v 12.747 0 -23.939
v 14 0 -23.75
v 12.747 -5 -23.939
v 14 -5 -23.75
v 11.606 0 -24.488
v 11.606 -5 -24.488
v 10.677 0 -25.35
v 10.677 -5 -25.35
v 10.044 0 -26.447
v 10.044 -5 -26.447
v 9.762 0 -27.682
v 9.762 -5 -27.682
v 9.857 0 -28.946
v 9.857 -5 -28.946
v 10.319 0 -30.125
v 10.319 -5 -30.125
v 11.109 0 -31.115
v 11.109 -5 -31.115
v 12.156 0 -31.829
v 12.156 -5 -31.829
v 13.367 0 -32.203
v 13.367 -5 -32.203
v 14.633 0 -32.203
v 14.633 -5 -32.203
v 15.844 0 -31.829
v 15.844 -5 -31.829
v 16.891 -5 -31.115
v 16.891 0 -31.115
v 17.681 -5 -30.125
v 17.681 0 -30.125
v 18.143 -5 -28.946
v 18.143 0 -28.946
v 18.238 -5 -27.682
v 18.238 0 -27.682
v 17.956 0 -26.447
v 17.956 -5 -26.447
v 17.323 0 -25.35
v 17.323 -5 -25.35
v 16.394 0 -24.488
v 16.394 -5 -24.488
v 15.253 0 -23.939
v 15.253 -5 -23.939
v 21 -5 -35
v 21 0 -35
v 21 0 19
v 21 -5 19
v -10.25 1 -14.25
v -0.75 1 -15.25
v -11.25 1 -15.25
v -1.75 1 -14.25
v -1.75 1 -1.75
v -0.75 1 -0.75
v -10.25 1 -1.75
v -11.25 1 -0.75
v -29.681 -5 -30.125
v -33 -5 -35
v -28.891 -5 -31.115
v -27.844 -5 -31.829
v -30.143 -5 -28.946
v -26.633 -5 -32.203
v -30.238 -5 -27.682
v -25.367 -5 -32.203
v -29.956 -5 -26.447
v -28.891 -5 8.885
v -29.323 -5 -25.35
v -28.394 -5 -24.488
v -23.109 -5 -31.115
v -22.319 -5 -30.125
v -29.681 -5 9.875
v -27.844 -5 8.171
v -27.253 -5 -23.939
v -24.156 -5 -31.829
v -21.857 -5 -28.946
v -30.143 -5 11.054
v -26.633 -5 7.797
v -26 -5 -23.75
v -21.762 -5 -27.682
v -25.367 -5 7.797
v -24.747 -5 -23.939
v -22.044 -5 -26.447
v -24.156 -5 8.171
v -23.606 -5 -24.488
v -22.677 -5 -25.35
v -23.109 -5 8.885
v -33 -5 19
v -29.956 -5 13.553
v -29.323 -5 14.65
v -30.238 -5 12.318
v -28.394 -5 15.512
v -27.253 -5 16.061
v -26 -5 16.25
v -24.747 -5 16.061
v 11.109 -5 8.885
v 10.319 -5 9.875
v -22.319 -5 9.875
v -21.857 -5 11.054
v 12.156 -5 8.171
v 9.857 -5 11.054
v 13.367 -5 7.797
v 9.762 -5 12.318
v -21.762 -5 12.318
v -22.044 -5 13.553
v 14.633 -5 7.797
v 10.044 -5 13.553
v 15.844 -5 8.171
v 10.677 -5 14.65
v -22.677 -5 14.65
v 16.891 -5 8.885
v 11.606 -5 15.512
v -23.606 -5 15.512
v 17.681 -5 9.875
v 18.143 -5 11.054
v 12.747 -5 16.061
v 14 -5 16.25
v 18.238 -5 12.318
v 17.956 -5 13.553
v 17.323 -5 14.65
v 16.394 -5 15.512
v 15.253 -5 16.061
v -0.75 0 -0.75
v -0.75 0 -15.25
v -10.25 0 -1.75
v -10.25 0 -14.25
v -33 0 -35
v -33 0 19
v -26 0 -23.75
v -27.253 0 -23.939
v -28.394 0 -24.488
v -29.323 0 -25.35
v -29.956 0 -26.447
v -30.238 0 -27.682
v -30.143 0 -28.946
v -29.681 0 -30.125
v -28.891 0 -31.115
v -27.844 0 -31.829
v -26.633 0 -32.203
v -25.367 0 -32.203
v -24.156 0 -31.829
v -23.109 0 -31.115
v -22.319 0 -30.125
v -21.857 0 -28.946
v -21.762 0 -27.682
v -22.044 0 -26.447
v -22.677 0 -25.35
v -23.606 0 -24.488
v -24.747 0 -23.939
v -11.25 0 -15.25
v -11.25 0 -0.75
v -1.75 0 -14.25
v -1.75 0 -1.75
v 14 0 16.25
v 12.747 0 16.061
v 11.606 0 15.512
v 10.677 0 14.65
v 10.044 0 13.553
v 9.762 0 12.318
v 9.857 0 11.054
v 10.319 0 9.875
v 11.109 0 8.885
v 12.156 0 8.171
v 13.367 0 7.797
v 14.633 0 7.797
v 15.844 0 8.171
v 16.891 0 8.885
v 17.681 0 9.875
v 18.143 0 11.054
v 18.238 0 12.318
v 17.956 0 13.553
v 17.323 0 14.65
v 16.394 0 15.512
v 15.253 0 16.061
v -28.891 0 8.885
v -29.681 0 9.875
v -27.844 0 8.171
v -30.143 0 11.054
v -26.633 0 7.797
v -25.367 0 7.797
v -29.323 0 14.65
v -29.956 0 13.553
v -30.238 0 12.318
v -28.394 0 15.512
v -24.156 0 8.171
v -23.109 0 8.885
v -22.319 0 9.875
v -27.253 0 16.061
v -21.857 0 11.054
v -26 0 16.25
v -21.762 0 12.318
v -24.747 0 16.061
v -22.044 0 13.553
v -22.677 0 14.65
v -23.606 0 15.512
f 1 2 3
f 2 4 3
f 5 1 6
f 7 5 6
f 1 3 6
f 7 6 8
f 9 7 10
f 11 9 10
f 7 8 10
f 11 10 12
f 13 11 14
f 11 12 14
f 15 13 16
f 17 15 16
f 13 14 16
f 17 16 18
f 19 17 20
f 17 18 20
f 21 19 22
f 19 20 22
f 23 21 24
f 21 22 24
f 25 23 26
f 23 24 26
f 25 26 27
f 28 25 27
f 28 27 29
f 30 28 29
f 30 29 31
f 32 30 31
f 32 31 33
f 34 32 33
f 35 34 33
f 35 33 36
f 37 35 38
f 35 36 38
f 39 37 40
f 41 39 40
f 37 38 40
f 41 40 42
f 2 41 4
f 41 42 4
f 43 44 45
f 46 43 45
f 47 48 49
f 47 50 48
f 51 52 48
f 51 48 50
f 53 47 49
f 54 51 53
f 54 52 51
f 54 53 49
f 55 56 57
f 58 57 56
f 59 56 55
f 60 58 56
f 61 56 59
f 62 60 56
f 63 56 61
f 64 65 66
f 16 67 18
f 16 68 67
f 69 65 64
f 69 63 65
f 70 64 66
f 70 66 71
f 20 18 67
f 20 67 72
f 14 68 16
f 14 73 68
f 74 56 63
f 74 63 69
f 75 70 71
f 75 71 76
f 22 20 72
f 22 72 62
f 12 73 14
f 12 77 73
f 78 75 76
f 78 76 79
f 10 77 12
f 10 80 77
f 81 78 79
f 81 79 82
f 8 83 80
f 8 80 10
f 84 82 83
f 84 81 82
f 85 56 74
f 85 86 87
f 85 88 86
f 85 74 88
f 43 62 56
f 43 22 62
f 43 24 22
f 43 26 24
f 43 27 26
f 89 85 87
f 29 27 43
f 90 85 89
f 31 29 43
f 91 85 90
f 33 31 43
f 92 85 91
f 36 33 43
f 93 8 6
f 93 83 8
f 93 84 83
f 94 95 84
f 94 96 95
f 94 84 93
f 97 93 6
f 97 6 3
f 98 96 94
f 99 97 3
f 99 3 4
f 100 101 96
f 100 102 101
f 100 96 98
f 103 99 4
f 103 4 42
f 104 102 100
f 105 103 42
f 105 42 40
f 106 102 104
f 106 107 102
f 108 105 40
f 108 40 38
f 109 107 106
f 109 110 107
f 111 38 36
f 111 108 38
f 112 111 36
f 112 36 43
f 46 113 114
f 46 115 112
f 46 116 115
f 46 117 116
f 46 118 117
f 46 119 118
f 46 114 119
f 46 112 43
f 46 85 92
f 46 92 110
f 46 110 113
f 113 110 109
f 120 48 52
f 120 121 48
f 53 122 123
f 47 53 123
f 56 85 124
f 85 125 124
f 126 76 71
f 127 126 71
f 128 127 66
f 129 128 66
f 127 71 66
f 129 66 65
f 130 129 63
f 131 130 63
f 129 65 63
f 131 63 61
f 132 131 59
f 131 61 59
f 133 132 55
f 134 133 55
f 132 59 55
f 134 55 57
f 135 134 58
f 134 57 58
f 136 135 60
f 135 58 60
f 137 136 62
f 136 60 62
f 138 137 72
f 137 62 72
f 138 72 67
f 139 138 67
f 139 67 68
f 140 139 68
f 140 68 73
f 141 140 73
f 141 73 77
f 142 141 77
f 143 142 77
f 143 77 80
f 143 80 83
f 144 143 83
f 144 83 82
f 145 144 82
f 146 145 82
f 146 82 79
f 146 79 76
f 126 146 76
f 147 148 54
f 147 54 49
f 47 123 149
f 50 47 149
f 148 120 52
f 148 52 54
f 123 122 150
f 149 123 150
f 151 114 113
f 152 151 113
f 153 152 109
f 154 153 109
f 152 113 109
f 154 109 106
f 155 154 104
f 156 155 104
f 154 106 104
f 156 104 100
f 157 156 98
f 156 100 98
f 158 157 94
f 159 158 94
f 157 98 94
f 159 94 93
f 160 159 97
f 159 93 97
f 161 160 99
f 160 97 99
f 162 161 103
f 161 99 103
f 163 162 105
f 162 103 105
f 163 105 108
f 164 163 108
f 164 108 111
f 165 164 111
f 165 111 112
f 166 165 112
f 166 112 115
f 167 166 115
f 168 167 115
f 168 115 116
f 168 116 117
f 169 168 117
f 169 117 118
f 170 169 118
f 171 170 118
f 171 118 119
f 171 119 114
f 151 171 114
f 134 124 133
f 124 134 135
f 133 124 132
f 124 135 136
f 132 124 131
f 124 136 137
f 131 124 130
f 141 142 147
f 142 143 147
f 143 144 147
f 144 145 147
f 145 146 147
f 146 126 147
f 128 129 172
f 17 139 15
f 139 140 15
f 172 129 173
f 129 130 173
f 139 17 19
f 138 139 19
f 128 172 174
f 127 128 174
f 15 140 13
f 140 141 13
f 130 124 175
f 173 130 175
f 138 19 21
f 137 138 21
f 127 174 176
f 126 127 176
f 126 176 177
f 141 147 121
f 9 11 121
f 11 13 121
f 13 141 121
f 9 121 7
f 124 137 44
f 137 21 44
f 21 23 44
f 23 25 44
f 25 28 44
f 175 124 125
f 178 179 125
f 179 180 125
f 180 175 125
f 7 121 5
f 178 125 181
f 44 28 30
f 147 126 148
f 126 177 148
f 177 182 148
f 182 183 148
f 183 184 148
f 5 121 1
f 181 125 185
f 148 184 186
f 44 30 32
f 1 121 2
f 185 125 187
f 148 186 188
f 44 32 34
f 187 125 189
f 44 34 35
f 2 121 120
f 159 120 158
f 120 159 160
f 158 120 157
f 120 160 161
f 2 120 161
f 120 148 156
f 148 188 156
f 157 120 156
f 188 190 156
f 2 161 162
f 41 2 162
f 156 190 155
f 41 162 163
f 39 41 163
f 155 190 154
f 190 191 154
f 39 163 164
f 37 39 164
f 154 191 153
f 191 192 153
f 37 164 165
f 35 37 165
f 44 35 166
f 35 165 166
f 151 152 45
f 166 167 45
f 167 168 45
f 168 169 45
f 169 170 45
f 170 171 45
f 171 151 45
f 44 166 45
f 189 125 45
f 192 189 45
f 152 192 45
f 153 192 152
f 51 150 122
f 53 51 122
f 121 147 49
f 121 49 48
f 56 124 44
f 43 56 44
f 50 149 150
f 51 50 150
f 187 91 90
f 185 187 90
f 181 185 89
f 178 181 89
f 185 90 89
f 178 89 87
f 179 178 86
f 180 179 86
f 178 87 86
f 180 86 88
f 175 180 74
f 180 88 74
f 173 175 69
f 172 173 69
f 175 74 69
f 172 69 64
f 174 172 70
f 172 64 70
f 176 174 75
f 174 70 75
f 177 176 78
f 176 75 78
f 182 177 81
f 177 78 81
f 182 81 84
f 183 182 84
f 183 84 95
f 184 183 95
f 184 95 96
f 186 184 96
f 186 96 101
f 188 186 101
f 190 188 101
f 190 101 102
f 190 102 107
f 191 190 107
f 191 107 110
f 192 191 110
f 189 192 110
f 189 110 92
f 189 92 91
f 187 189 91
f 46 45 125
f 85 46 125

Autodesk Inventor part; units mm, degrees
ref_plane "YZ Plane" through (0, 0, 0) normal (1, 0, 0) x (0, 1, 0)
ref_plane "XZ Plane" through (0, 0, 0) normal (0, 1, 0) x (-1, 0, 0)
ref_plane "XY Plane" through (0, 0, 0) normal (0, 0, 1) x (1, 0, 0)
sketch "Skizze1" plane through (0, 0, 0) normal (0, 1, 0) x (-1, 0, 0)
  line L0 (0, 0) -> (12, 0)
  line L1 (12, 0) -> (12, -16)
  line L2 (12, -16) -> (0, -16)
  line L3 (0, -16) -> (0, 0)
  line L4 (-5, 5) -> (17, 5)
  line L5 (17, 5) -> (17, -21)
  line L6 (17, -21) -> (-5, -21)
  line L7 (-5, -21) -> (-5, 5)
  line L8 (-1, 1) -> (13, 1)
  line L9 (13, 1) -> (13, -17)
  line L10 (13, -17) -> (-1, -17)
  line L11 (-1, -17) -> (-1, 1)
  line L12 (1.75, -1.75) -> (10.25, -1.75)
  line L13 (10.25, -1.75) -> (10.25, -14.25)
  line L14 (10.25, -14.25) -> (1.75, -14.25)
  line L15 (1.75, -14.25) -> (1.75, -1.75)
  line L16 (0.75, -0.75) -> (11.25, -0.75)
  line L17 (11.25, -0.75) -> (11.25, -15.25)
  line L18 (11.25, -15.25) -> (0.75, -15.25)
  line L19 (0.75, -15.25) -> (0.75, -0.75)
  point P0 (6, 0)
  point P1 (6, 5)
  point P2 (6, -16)
  point P3 (12, -8)
  point P4 (6, -1.75)
  point P5 (6, -14.25)
  point P6 (10.25, -8)
  point P7 (1.75, -8)
  dimension "d0" = 16
  dimension "d1" = 12
  dimension "d2" = 5
  dimension "d3" = 5
  dimension "d5" = 5
  dimension "d6" = 5
  dimension "d56" = 1
  dimension "d57" = 1
  dimension "d58" = 1
  dimension "d60" = 1.75
  dimension "d61" = 1.75
  dimension "d63" = 8.5
  dimension "d64" = 1
  dimension "d65" = 1
  dimension "d67" = 1
  dimension "d69" = 12.5
  dimension "d70" = 1
  dimension "d71" = 1.75
  dimension "d72" = 1.75
extrude "Extrusion1" add sketch "Skizze1" along normal blind 1 contours L16 L17 L18 L19
sketch "Skizze2" plane through (0, 0, 0) normal (0, -1, 0) x (1, 0, 0)
  line L0 (21, 19) -> (-33, 19)
  line L1 (-33, 19) -> (-33, -35)
  line L2 (-33, -35) -> (21, -35)
  line L3 (21, -35) -> (21, 19)
  line L4 (-17, -21) -> (-17, 5) projected
  line L5 (5, -21) -> (-17, -21) projected
  line L6 (5, 5) -> (5, -21) projected
  line L7 (-17, 5) -> (5, 5) projected
  point P0 (0, 0)
  dimension "d11" = 16
  dimension "d12" = 14
  dimension "d13" = 16
  dimension "d14" = 14
  dimension "d35" = 54
  dimension "d36" = 54
extrude "Extrusion2" add sketch "Skizze2" along normal blind 5 contours L3 L2 L1 L0 | L4 L7 L6 L5
sketch "Skizze4" plane through (0, 0, 0) normal (0, 1, 0) x (1, 0, 0)
  line L0 (21, 35) -> (21, -19) projected
  line L1 (-33, 35) -> (21, 35) projected
  line L2 (21, -19) -> (-33, -19) projected
  line L3 (-33, -19) -> (-33, 35) projected
  point P0 (0, 0)
  point P1 (14, 28)
  point P2 (14, -12)
  point P3 (-26, -12)
  point P4 (-26, 28)
  dimension "d44" = 7
  dimension "d45" = 7
  dimension "d46" = 7
  dimension "d47" = 7
  dimension "d48" = 7
  dimension "d49" = 7
  dimension "d50" = 7
  dimension "d51" = 7
  dimension "d52" = 40
  dimension "d53" = 40
  dimension "d54" = 40
  dimension "d55" = 40
hole "Bohrung1" at (14, 0, -28) at (14, 0, 12) at (-26, 0, 12) at (-26, 0, -28) direction (0, -1, 0) diameter 8.5 depth 5
properties part number "Magazin_1_3D-Druck"
